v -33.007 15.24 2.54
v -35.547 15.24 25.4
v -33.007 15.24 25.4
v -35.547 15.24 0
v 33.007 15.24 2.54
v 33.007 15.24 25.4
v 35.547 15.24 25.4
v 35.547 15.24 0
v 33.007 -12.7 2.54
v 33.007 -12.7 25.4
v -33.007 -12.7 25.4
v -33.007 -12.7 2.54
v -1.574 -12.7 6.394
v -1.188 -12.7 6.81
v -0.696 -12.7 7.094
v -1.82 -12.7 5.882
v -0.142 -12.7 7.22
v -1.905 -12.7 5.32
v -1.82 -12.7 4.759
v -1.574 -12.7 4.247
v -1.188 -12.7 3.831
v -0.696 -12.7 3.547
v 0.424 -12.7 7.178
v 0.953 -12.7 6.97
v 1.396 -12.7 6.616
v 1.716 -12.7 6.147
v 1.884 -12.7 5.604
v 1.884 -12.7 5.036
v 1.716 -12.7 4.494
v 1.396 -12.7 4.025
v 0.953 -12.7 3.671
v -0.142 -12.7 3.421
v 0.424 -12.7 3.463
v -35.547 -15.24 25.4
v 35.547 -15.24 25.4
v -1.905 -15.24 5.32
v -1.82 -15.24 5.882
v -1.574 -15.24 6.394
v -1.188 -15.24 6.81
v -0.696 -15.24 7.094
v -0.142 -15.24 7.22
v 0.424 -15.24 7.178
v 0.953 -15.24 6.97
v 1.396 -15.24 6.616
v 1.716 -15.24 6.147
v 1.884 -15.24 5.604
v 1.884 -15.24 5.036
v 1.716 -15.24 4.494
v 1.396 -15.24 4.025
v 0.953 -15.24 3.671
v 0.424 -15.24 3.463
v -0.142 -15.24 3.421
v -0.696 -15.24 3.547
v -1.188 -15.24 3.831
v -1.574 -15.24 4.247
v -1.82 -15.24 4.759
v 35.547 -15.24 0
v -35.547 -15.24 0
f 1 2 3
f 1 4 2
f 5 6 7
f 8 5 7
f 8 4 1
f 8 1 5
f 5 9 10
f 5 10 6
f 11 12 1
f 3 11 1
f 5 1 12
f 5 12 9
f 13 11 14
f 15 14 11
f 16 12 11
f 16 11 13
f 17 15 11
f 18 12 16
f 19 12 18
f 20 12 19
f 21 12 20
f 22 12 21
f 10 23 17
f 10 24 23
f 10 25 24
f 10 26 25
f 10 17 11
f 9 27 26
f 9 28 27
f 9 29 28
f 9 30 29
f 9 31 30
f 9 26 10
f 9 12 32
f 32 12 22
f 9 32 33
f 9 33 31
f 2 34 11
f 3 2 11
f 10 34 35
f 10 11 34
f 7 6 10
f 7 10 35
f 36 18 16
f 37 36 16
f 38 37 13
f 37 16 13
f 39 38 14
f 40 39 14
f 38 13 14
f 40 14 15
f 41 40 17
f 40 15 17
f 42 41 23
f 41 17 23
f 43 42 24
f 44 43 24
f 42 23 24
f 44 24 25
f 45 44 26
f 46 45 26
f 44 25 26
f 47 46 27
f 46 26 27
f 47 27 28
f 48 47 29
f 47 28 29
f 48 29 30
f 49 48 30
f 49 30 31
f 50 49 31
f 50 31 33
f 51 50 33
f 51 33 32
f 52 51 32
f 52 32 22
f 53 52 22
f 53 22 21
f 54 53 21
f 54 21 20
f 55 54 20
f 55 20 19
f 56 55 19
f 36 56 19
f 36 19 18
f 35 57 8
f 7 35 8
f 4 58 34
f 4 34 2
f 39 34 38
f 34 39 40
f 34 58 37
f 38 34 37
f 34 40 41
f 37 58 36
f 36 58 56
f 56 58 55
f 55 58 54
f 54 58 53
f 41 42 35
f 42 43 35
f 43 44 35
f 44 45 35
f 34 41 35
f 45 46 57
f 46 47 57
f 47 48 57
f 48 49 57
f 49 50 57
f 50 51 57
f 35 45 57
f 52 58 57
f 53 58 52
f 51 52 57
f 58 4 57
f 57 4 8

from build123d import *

# Parameters (mm, degrees)
F0_W     = 71.0946
F0_H     = 30.48
F1_DEPTH = 25.4
F2_T     = -2.54
F4_D     = 3.81


with BuildPart() as f1:
    # F0 (on Top) → F1 (new body)
    with BuildSketch(Plane.XY):
        Rectangle(F0_W, F0_H)
    extrude(amount=F1_DEPTH)

    # F2
    f2_openings = [f1.faces().sort_by_distance(p)[0] for p in [
        (0, 15.24, 12.7),
        (0, 0, 25.4),
    ]]
    offset(amount=F2_T, openings=f2_openings)

    # F4 (through all)
    with Locations(Plane.XZ.offset(15.24)):
        with Locations((0, 5.320419)):
            Hole(F4_D / 2)


solid = f1.part
